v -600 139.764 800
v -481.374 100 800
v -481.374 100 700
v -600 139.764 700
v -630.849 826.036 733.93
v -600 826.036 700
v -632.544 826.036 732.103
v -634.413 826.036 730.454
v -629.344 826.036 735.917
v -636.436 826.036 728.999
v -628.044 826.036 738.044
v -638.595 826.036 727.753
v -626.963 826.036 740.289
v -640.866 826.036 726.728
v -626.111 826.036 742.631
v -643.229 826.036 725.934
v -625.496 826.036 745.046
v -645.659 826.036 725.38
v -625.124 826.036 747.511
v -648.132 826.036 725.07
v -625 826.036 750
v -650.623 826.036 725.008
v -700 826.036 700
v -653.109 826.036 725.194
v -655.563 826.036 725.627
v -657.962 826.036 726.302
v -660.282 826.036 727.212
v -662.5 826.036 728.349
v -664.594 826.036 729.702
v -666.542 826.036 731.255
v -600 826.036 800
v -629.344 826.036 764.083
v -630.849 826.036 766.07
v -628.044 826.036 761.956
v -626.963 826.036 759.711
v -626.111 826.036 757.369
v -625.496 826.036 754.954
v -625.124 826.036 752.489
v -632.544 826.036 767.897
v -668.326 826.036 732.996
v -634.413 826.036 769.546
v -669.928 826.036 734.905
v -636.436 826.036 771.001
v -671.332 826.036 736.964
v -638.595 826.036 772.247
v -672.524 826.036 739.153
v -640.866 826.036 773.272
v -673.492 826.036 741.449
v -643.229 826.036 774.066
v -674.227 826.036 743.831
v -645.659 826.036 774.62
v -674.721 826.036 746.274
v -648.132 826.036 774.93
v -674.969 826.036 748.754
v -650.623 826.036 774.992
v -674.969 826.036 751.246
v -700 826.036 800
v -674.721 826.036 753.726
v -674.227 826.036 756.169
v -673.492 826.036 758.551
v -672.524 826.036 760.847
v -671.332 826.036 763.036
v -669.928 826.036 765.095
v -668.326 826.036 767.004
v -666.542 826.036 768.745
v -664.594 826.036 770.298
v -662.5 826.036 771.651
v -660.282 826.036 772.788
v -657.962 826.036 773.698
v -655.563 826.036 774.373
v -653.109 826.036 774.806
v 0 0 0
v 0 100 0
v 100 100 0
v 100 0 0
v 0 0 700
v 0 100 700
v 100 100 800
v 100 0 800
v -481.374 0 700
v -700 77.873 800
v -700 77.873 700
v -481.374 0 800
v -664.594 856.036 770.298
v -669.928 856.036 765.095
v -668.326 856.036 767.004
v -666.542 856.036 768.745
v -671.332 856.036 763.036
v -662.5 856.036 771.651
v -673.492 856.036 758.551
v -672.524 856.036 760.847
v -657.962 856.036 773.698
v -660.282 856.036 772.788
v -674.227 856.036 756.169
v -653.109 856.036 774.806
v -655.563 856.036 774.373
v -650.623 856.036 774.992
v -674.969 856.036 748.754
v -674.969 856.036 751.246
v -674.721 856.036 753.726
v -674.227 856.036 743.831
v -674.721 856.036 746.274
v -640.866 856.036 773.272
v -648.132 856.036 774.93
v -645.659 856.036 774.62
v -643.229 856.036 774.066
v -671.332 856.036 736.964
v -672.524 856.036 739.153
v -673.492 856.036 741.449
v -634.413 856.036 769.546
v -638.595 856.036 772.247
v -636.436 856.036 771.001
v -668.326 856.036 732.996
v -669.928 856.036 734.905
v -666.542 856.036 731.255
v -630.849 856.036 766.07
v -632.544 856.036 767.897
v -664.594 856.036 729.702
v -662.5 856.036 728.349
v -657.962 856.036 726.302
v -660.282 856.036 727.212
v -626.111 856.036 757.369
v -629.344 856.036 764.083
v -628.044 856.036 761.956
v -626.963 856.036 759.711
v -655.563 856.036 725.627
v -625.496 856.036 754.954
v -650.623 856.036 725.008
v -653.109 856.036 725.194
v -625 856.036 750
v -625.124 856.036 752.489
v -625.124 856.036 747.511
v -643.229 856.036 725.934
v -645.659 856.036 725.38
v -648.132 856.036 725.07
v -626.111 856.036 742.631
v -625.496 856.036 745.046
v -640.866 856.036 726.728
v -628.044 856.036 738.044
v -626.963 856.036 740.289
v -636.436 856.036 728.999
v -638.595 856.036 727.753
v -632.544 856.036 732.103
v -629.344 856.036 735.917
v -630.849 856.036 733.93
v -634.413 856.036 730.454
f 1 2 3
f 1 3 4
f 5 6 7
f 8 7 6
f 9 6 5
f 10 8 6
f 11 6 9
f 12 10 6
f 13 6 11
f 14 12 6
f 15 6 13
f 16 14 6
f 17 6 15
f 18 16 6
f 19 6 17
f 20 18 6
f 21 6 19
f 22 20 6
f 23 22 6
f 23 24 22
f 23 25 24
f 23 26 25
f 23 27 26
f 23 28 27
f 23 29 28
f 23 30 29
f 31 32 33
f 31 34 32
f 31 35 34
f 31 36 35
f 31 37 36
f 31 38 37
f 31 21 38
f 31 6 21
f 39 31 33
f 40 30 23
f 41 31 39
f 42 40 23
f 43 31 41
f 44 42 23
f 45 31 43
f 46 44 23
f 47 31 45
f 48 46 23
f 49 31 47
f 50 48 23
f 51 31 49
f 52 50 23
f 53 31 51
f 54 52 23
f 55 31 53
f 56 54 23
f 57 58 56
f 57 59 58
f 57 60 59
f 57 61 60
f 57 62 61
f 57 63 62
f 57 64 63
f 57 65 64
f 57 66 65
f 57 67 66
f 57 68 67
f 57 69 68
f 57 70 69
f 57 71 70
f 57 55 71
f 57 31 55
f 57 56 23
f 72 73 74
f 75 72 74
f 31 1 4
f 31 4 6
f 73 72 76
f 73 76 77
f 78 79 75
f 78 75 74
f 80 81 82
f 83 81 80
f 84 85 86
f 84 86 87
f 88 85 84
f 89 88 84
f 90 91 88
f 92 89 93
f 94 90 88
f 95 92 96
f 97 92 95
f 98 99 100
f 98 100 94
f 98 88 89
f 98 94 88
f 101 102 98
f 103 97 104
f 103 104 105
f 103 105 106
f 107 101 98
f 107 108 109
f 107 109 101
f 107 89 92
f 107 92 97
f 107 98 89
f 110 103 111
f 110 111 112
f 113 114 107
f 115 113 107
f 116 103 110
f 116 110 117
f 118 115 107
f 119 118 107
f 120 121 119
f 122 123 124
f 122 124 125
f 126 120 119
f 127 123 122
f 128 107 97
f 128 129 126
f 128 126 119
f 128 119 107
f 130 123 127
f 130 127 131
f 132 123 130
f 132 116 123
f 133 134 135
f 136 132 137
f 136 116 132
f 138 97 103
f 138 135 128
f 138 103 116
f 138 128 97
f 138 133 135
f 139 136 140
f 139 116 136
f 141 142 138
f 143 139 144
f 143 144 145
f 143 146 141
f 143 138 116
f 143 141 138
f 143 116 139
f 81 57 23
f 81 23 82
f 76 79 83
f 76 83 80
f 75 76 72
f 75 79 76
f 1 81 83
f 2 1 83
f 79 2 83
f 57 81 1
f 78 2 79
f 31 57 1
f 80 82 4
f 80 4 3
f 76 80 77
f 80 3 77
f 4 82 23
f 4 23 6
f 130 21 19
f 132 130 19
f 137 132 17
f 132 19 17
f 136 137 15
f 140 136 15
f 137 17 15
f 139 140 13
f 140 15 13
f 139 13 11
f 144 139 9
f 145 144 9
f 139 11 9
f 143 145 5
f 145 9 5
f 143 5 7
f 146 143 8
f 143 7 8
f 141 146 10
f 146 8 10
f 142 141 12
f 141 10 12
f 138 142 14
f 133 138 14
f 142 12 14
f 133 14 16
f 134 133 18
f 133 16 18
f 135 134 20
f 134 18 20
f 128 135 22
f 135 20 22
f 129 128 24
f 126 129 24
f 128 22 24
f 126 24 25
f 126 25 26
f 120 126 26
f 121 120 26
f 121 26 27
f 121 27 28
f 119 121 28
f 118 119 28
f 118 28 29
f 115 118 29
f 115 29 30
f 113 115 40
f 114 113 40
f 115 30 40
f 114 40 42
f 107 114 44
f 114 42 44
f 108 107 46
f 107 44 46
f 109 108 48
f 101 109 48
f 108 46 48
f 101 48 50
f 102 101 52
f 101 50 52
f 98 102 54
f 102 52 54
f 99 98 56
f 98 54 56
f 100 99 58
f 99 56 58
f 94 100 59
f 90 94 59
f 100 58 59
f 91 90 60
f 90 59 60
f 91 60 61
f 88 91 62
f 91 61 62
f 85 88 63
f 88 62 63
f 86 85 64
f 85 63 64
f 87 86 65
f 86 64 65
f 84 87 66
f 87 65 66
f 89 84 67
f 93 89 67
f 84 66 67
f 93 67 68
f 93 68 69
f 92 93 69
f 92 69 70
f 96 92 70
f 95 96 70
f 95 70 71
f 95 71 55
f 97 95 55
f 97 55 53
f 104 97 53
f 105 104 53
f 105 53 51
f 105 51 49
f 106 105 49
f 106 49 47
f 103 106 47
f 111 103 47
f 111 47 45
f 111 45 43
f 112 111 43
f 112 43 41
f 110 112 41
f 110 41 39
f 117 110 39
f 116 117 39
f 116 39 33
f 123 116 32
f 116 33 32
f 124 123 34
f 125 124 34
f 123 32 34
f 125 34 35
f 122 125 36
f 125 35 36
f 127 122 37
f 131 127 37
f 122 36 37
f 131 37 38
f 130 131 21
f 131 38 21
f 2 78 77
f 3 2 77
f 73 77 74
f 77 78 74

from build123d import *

# Parameters (mm, degrees)
SKETCH1_W           = 100
SKETCH1_H           = 100
BOSS_EXTRUDE1_DEPTH = 800
SKETCH2_W           = 100
SKETCH2_H           = 100
BOSS_EXTRUDE2_DEPTH = 700
BOSS_EXTRUDE3_DEPTH = 100
SKETCH5_R           = 25
BOSS_EXTRUDE4_DEPTH = 25
CUT_EXTRUDE2_DEPTH  = 801
BOSS_EXTRUDE5_DEPTH = 100
CUT_EXTRUDE3_DEPTH  = 801
SKETCH10_R          = 25
BOSS_EXTRUDE6_DEPTH = 30


with BuildPart() as part:
    # Sketch1 → Boss-Extrude1 (new body)
    with BuildSketch(Plane.XY):
        with Locations((50, 50)):
            Rectangle(SKETCH1_W, SKETCH1_H)
    extrude(amount=BOSS_EXTRUDE1_DEPTH)

    # Sketch2 → Boss-Extrude2 (add)
    with BuildSketch(Plane(origin=(0, 0, 0), x_dir=(0, 0, -1), z_dir=(1, 0, 0))):
        with Locations((-750, 50)):
            Rectangle(SKETCH2_W, SKETCH2_H)
    extrude(amount=-BOSS_EXTRUDE2_DEPTH)

    # Sketch4 → Boss-Extrude3 (add)
    with BuildSketch(Plane.XY.offset(800)):
        Polygon((-493.990986432, 0), (-600, -41.564522078), (-600, -730.356100977), (-700, -730.356100977), (-700, 0), align=None)
    extrude(amount=-BOSS_EXTRUDE3_DEPTH)

    # Sketch5 → Boss-Extrude4 (add)
    with BuildSketch(Plane(origin=(0, -730.356100977, 0), x_dir=(-1, 0, 0), z_dir=(0, -1, 0))):
        with Locations((650, -750)):
            Circle(SKETCH5_R)
    extrude(amount=BOSS_EXTRUDE4_DEPTH)

    # Sketch6 → Cut-Extrude2 (cut, through all)
    with BuildSketch(Plane.XY.offset(800)):
        Polygon((-700, 0), (-700, 77.872935738), (-481.374152596, 0), align=None)
    extrude(amount=-CUT_EXTRUDE2_DEPTH, mode=Mode.SUBTRACT)

    # Sketch8 → Boss-Extrude5 (add)
    with BuildSketch(Plane.XY.offset(800)):
        Polygon((-700, 100), (-600, 100), (-481.374152596, 100), (-600, 139.764231535), (-600, 826.035666916), (-700, 826.035666916), align=None)
    extrude(amount=-BOSS_EXTRUDE5_DEPTH)

    # Sketch9 → Cut-Extrude3 (cut, through all)
    with BuildSketch(Plane.XY.offset(800)):
        Polygon((-740.353325761, 0), (-493.364641431, 0), (-493.364641431, -882.481689371), (-837.990616097, -863.88243179), align=None)
    extrude(amount=-CUT_EXTRUDE3_DEPTH, mode=Mode.SUBTRACT)

    # Sketch10 → Boss-Extrude6 (add)
    with BuildSketch(Plane(origin=(0, 826.035666916, 0), x_dir=(1, 0, 0), z_dir=(0, 1, 0))):
        with Locations((-650, -750)):
            Circle(SKETCH10_R)
    extrude(amount=BOSS_EXTRUDE6_DEPTH)


solid = part.part
